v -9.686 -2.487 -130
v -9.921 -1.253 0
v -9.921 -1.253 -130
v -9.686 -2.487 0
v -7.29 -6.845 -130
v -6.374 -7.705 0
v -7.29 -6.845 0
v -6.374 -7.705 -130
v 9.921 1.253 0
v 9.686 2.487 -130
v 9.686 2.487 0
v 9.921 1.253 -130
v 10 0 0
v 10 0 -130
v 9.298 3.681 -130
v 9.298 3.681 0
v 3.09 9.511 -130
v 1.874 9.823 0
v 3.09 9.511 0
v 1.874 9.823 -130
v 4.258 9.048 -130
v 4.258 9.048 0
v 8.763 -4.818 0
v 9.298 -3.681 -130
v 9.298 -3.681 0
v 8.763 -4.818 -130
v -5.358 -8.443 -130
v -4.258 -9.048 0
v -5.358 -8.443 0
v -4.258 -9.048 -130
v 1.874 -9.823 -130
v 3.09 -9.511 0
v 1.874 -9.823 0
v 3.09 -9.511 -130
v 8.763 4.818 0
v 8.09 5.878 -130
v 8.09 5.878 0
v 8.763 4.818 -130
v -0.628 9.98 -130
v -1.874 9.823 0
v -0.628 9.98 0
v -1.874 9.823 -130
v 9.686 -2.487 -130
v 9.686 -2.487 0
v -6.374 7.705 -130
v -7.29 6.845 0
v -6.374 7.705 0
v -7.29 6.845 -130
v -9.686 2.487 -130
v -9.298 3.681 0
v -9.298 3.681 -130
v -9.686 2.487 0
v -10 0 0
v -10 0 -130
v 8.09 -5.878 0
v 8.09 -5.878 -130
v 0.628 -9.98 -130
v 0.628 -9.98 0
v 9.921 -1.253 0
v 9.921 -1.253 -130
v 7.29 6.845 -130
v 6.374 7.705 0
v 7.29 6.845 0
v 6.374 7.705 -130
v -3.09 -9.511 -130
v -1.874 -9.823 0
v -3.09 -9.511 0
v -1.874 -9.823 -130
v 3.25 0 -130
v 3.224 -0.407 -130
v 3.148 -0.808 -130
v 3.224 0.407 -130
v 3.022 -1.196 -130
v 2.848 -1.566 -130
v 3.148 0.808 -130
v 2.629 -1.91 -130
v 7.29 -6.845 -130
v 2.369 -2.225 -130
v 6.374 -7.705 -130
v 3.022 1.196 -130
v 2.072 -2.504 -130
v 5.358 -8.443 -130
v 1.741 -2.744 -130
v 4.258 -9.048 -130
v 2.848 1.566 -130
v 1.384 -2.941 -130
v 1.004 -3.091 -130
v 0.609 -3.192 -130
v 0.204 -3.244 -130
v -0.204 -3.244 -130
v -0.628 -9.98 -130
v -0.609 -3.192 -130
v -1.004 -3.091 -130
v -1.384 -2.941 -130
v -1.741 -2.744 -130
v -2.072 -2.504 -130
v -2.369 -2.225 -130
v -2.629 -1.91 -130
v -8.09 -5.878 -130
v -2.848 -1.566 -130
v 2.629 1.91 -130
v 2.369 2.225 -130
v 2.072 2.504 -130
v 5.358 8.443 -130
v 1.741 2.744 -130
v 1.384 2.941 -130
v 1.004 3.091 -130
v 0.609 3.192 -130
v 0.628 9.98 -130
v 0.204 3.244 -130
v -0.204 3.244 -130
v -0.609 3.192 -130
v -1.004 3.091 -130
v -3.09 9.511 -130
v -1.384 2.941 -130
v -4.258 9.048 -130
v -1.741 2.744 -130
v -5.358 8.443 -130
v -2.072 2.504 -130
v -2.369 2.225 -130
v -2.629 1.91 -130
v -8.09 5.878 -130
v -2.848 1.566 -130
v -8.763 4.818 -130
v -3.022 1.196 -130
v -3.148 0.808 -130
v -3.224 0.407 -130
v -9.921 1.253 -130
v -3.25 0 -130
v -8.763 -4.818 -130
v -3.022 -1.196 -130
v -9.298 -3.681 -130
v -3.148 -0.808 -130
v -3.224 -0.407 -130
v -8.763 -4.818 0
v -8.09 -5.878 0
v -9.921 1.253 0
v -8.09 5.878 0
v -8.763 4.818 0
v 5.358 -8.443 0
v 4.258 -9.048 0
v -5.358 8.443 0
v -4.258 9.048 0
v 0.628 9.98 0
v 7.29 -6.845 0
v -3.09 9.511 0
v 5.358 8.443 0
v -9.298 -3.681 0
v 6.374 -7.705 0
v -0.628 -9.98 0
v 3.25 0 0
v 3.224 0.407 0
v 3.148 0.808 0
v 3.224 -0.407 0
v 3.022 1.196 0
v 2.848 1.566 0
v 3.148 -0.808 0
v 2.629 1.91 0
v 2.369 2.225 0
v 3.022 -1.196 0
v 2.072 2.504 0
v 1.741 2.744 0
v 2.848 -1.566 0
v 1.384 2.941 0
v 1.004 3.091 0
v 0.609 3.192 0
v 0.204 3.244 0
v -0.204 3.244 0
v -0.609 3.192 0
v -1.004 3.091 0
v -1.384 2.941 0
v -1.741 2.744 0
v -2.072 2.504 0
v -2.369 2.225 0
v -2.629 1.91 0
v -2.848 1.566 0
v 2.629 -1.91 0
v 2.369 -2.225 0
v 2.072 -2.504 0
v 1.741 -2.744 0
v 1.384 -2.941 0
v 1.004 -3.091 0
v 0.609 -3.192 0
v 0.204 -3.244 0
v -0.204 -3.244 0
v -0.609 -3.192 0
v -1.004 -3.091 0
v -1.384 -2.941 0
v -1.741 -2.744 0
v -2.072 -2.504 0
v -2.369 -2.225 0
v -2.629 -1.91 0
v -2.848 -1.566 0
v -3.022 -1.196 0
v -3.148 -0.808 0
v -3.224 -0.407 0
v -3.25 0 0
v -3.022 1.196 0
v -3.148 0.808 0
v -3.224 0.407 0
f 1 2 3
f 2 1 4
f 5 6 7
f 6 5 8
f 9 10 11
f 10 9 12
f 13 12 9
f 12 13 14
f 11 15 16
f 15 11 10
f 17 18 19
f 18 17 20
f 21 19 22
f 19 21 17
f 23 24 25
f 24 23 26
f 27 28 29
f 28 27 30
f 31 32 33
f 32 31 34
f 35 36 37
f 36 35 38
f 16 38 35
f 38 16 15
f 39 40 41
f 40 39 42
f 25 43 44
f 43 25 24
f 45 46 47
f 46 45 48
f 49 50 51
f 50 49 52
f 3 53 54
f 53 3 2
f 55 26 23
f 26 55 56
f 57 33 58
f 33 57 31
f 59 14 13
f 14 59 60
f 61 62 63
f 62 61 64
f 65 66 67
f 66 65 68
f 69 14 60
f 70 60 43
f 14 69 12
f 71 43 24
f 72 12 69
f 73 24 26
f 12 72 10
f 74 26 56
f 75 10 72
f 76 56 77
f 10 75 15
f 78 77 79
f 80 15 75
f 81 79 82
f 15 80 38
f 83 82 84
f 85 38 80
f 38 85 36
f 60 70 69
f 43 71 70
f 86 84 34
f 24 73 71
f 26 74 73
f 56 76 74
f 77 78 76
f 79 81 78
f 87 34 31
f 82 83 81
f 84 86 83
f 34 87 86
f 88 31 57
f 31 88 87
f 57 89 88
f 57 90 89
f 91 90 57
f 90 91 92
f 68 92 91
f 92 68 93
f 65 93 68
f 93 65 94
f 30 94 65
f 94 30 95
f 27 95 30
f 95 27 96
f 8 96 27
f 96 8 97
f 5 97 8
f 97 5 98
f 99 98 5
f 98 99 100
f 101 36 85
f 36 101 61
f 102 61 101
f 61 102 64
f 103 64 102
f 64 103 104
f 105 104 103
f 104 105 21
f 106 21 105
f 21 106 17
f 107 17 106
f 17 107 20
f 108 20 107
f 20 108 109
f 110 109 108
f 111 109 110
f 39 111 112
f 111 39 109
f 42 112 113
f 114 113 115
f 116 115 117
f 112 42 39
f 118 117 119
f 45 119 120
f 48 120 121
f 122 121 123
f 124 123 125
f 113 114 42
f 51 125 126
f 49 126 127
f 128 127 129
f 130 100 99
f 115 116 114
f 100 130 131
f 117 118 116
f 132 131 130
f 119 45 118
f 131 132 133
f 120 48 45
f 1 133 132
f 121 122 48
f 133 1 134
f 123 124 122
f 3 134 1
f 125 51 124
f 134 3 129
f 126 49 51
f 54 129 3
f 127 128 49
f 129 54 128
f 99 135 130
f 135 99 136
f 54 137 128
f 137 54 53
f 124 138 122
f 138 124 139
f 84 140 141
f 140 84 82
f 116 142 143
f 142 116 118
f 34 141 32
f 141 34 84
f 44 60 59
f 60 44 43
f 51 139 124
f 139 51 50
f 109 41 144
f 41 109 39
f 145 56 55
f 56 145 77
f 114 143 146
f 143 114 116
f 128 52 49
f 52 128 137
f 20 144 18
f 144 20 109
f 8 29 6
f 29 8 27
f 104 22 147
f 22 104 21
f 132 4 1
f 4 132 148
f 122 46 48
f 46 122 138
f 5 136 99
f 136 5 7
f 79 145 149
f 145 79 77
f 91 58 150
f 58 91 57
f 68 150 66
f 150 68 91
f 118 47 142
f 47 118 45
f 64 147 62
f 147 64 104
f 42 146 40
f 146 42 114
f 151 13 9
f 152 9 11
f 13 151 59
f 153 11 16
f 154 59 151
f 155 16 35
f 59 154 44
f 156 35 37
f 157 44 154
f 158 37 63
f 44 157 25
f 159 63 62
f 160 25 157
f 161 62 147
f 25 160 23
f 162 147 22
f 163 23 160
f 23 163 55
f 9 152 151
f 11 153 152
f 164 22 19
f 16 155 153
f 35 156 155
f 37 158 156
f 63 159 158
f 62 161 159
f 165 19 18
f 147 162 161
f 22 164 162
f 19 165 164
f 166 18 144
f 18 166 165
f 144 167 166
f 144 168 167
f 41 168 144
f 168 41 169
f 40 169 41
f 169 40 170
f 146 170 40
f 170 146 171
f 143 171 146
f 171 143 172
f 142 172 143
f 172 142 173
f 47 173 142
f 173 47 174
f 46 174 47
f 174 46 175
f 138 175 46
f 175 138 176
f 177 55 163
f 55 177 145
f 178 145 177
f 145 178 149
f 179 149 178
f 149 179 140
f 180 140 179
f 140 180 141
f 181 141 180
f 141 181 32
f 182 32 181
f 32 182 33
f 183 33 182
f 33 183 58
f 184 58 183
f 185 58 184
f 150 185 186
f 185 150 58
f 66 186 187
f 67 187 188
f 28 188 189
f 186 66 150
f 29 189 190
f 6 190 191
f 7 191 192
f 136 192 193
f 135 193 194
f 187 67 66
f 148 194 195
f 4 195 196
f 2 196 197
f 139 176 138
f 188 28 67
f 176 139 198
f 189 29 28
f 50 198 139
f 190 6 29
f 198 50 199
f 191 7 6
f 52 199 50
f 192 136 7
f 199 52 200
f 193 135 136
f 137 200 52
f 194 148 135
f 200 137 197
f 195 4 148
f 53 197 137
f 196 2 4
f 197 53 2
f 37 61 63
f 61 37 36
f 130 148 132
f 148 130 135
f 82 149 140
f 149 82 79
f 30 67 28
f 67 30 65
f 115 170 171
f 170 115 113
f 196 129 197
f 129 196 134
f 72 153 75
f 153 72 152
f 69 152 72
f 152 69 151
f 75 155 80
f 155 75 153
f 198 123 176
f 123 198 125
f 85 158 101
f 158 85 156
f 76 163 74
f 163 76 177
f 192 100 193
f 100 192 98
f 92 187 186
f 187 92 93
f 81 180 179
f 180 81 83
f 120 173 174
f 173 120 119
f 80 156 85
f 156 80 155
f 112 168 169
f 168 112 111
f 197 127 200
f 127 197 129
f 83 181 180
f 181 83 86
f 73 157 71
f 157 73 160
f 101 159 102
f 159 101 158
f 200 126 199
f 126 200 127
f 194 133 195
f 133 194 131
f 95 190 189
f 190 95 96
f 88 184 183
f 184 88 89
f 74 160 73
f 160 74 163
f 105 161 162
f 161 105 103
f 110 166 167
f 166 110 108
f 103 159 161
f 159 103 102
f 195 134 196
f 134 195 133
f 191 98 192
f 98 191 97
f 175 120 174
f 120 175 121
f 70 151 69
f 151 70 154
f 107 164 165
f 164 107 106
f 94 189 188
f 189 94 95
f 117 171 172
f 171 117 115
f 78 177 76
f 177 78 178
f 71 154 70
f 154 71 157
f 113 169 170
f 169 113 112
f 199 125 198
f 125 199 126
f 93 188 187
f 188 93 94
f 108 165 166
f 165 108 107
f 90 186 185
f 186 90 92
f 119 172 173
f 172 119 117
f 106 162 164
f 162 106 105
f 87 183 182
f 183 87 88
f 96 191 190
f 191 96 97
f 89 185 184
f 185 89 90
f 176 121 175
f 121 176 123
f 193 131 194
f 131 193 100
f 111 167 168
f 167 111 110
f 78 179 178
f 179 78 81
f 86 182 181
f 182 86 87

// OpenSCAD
$fn = 50;


difference() {
	union() {
		translate(v = [0, 0, -130.0000000000]) {
			cylinder(h = 130, r = 10.0000000000);
		}
		cylinder(h = 0, r = 13.0000000000);
	}
	union() {
		#translate(v = [0, 0, -130]) {
			cylinder(h = 130, r = 3.2500000000);
		}
	}
}
